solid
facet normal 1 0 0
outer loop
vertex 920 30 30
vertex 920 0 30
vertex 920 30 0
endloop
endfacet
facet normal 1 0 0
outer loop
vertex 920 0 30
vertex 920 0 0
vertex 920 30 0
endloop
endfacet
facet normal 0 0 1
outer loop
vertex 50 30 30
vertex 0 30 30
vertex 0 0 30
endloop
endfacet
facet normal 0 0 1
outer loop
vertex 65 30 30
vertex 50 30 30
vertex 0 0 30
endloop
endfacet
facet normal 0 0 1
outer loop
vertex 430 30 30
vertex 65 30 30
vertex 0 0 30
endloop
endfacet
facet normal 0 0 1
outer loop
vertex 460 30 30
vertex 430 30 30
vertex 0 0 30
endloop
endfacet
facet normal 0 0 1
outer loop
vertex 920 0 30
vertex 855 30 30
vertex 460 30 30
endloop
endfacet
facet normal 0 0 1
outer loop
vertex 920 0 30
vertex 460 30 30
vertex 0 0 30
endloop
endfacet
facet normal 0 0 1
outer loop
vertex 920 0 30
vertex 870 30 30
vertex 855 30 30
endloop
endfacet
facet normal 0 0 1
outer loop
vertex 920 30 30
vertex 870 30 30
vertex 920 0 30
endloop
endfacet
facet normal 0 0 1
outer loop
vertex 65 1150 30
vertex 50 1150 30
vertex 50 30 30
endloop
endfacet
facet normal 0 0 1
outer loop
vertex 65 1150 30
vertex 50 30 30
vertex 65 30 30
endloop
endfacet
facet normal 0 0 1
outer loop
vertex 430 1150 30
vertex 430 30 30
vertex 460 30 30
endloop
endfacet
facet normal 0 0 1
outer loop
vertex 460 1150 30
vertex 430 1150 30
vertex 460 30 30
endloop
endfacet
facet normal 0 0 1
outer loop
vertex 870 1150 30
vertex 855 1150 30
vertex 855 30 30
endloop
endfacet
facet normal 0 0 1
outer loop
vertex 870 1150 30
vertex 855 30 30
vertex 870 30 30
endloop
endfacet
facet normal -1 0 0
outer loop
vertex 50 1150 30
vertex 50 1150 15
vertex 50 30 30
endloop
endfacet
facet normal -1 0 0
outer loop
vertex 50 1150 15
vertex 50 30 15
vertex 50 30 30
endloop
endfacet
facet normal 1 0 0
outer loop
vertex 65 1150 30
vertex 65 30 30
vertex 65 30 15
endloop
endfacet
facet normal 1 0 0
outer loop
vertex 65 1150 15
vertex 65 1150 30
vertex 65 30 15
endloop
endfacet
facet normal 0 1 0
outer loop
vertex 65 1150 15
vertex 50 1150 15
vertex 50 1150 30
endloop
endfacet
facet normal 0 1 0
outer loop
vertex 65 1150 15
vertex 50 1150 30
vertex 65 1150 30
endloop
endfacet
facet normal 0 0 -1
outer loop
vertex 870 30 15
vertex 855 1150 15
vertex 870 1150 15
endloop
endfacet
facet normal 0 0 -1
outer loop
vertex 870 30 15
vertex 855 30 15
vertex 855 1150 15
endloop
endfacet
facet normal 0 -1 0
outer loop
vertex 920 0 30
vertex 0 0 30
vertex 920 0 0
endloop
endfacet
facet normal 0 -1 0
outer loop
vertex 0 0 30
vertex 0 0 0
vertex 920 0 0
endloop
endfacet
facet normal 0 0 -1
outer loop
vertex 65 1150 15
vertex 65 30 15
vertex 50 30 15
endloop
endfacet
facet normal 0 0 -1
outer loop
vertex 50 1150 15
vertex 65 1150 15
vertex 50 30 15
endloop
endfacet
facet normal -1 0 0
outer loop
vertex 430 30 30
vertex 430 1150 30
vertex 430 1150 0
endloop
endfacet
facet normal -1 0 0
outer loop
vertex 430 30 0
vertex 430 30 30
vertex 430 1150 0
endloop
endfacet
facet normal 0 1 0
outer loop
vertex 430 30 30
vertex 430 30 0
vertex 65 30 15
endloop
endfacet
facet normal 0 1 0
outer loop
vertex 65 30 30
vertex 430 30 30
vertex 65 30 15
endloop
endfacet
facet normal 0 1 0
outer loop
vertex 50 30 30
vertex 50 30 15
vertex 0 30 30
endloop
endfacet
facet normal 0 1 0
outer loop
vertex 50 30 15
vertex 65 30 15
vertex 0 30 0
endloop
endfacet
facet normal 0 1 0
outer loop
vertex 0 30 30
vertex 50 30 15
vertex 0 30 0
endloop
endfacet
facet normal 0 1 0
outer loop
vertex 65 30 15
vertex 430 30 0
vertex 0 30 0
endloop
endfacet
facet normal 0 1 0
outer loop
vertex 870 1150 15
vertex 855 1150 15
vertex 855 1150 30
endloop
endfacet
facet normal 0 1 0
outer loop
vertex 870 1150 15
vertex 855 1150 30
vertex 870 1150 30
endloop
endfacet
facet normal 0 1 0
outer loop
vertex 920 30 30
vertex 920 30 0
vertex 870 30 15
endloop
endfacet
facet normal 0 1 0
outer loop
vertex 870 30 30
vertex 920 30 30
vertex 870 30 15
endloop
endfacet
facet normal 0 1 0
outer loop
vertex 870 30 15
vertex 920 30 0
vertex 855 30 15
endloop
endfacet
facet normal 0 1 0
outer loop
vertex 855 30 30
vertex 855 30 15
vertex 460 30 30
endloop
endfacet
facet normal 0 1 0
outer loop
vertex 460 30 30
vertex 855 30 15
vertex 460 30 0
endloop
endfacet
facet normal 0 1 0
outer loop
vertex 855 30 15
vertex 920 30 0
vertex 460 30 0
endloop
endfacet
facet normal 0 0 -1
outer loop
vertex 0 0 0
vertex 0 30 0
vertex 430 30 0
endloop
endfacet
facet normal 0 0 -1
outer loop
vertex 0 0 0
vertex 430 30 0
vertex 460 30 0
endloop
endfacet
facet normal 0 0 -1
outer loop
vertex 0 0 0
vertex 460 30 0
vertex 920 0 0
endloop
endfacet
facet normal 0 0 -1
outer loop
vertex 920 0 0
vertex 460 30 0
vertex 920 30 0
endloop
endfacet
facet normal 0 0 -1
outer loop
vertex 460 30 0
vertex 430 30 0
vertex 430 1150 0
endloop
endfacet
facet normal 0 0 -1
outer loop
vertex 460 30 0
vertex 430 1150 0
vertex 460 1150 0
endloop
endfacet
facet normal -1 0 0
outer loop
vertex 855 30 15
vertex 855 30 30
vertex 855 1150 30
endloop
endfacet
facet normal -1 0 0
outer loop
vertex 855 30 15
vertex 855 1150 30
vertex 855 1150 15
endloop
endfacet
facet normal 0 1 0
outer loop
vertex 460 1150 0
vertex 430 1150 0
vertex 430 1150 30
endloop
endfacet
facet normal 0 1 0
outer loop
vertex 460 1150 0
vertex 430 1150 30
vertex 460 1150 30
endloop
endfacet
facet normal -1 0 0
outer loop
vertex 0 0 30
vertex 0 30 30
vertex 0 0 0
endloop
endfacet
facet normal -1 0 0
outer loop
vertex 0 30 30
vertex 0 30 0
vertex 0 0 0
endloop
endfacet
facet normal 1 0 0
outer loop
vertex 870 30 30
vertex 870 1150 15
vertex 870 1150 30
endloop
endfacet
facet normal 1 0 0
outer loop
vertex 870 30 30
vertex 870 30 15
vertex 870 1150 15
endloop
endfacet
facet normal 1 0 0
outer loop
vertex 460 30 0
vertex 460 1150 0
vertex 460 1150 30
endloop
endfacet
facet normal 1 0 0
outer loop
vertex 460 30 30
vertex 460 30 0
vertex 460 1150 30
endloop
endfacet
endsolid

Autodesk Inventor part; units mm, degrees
ref_plane "YZ Plane" through (0, 0, 0) normal (1, 0, 0) x (0, 1, 0)
ref_plane "XZ Plane" through (0, 0, 0) normal (0, 1, 0) x (-1, 0, 0)
ref_plane "XY Plane" through (0, 0, 0) normal (0, 0, 1) x (1, 0, 0)
sketch "Sketch1" plane through (0, 0, 0) normal (0, 0, 1) x (1, 0, 0)
  line L0 (0, 0) -> (920, 0)
  line L1 (920, 0) -> (920, 30)
  line L2 (920, 30) -> (0, 30)
  line L3 (0, 30) -> (0, 0)
  dimension "d0" = 30
  dimension "d1" = 920
extrude "Extrusion1" add sketch "Sketch1" along normal blind 30
sketch "Sketch2" plane through (0, 30, 0) normal (0, 1, 0) x (1, 0, 0)
  line L0 (920, -30) -> (0, -30) projected
  line L1 (50, -30) -> (65, -30)
  line L2 (65, -30) -> (65, -15)
  line L3 (65, -15) -> (50, -15)
  line L4 (50, -15) -> (50, -30)
  line L5 (0, 0) -> (0, -30) projected
  line L6 (870, -30) -> (855, -30)
  line L7 (855, -30) -> (855, -15)
  line L8 (855, -15) -> (870, -15)
  line L9 (870, -15) -> (870, -30)
  line L10 (920, 0) -> (920, -30) projected
  dimension "d4" = 15
  dimension "d5" = 15
  dimension "d6" = 50
  dimension "d7" = 15
  dimension "d8" = 15
  dimension "d9" = 50
extrude "Extrusion2" add sketch "Sketch2" along normal blind 1120
sketch "Sketch3" plane through (0, 30, 0) normal (0, 1, 0) x (1, 0, 0)
  line L0 (920, 0) -> (0, 0) projected
  line L1 (855, -30) -> (65, -30) projected
  line L2 (430, 0) -> (460, 0)
  line L3 (460, 0) -> (460, -30)
  line L4 (460, -30) -> (430, -30)
  line L5 (430, -30) -> (430, 0)
  line L6 (920, 0) -> (920, -30) projected
  point P0 (460, -15)
  dimension "d12" = 30
  dimension "d13" = 460
extrude "Extrusion3" add sketch "Sketch3" along normal blind 1120
properties part number "Nhom30"
